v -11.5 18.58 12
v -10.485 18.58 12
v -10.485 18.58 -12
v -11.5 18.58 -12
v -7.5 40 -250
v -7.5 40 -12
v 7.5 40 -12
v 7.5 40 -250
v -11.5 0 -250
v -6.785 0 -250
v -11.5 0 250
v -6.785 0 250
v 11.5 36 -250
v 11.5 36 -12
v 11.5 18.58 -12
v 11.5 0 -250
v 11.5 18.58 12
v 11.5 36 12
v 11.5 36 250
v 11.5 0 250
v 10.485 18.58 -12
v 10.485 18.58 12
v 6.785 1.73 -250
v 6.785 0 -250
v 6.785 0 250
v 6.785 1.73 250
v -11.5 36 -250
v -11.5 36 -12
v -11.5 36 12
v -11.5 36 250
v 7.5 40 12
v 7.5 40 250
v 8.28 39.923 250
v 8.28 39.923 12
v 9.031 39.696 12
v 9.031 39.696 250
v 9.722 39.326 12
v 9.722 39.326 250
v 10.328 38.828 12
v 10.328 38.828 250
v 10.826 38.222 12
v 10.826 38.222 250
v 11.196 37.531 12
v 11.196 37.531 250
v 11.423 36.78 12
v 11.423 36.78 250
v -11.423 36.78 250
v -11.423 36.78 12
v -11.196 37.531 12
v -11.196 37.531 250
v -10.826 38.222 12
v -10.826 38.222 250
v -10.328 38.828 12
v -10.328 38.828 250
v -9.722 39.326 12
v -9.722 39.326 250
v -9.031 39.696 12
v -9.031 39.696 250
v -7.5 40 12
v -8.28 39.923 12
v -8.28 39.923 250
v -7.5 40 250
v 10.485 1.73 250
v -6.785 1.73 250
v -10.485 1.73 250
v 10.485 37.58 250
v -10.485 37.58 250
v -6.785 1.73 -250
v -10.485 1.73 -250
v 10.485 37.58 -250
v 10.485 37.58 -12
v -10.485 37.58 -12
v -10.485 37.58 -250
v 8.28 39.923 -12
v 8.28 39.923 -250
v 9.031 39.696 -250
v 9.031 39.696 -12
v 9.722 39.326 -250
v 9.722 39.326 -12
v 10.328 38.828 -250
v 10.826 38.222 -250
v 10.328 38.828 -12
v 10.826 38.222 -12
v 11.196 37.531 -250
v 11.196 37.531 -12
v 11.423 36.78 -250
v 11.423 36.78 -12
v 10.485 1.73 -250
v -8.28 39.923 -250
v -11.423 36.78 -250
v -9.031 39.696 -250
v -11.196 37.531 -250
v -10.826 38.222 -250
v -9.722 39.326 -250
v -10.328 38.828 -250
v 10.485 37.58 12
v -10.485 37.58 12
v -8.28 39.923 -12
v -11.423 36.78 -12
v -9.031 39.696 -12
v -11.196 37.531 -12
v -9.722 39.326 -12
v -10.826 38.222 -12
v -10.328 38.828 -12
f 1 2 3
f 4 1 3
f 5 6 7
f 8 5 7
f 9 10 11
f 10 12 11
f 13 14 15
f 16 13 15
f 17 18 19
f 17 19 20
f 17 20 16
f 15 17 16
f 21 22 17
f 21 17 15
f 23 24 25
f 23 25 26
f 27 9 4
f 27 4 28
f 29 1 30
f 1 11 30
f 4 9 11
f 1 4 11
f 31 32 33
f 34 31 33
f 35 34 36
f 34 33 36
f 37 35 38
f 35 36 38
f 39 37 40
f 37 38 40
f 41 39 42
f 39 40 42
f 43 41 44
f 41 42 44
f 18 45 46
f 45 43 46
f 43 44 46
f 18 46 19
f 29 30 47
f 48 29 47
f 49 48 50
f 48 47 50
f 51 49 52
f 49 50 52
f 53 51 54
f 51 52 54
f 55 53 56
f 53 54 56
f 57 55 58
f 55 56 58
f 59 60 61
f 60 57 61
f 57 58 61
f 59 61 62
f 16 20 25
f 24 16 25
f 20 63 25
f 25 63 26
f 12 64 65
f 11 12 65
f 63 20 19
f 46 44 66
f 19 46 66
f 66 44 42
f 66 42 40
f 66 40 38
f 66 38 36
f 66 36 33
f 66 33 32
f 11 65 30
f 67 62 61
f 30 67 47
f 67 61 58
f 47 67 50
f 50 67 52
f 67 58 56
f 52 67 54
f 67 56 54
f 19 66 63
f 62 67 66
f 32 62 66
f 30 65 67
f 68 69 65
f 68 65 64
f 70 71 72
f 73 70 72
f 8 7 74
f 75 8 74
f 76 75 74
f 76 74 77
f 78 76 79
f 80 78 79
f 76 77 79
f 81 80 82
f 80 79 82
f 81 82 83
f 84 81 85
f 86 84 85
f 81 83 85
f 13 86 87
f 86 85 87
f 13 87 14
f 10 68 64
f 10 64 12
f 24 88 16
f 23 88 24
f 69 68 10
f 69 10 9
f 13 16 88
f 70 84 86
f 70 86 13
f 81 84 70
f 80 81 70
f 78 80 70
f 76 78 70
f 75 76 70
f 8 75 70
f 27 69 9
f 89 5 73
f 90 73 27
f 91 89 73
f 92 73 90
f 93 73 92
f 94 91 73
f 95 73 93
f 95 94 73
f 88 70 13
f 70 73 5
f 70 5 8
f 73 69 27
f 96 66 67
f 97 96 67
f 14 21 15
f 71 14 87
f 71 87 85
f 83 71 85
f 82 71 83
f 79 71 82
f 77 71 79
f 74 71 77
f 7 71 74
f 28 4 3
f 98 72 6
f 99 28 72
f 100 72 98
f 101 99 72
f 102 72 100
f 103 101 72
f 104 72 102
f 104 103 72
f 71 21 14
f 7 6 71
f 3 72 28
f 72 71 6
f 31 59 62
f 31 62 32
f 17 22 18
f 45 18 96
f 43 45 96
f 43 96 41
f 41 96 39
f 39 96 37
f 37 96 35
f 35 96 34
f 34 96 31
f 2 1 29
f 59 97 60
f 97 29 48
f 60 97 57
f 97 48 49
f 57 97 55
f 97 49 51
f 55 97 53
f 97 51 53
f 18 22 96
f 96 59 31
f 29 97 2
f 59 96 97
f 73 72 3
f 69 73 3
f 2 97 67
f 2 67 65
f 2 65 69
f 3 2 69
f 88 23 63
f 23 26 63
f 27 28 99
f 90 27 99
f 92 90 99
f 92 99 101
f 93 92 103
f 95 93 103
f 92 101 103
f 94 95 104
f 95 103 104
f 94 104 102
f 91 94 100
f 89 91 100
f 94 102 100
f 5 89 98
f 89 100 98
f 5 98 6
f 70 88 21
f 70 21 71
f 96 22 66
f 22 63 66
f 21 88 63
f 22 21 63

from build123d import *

# Parameters (mm, degrees)
BOSS_EXTRUDE1_DEPTH            = 250
CUT_EXTRUDE1_REACH             = 255.441
SKETCH2_W                      = 24
SKETCH2_H                      = 21.42
CUT_EXTRUDE1_DIRECTION_2_REACH = 255.441


with BuildPart() as part:
    # Sketch1 → Boss-Extrude1 (new, symmetric)
    with BuildSketch(Plane.XY):
        with BuildLine():
            Line((6.785, 0), (6.785, 1.73))
            Line((6.785, 1.73), (10.485, 1.73))
            Line((10.485, 1.73), (10.485, 37.58))
            Line((10.485, 37.58), (-10.485, 37.58))
            Line((-10.485, 37.58), (-10.485, 1.73))
            Line((-10.485, 1.73), (-6.785, 1.73))
            Line((-6.785, 1.73), (-6.785, 0))
            Line((-6.785, 0), (-11.5, 0))
            Line((-11.5, 0), (-11.5, 36))
            ThreePointArc((-11.5, 36), (-10.328427125, 38.828427125), (-7.5, 40))
            Line((-7.5, 40), (7.5, 40))
            ThreePointArc((7.5, 40), (10.328427125, 38.828427125), (11.5, 36))
            Line((11.5, 36), (11.5, 0))
            Line((11.5, 0), (6.785, 0))
        make_face()
    extrude(amount=BOSS_EXTRUDE1_DEPTH, both=True)

    # Sketch2 → Cut-Extrude1 (cut, up to next)
    with BuildSketch(Plane(origin=(0, 0, 0), x_dir=(0, 0, -1), z_dir=(1, 0, 0)), mode=Mode.PRIVATE) as cut_extrude1_sk1:
        with Locations((0, 29.29)):
            Rectangle(SKETCH2_W, SKETCH2_H)
    cut_extrude1_tool1 = extrude(cut_extrude1_sk1.sketch, amount=-CUT_EXTRUDE1_REACH, mode=Mode.PRIVATE) & part.part
    add(cut_extrude1_tool1.solids().sort_by_distance((0, 29.29, 0))[0], mode=Mode.SUBTRACT)

    # Sketch2 → Cut-Extrude1 direction 2 (cut, up to next)
    with BuildSketch(Plane(origin=(0, 0, 0), x_dir=(0, 0, -1), z_dir=(1, 0, 0)), mode=Mode.PRIVATE) as cut_extrude1_direction_2_sk1:
        with Locations((0, 29.29)):
            Rectangle(SKETCH2_W, SKETCH2_H)
    cut_extrude1_direction_2_tool1 = extrude(cut_extrude1_direction_2_sk1.sketch, amount=CUT_EXTRUDE1_DIRECTION_2_REACH, mode=Mode.PRIVATE) & part.part
    add(cut_extrude1_direction_2_tool1.solids().sort_by_distance((0, 29.29, 0))[0], mode=Mode.SUBTRACT)


solid = part.part
